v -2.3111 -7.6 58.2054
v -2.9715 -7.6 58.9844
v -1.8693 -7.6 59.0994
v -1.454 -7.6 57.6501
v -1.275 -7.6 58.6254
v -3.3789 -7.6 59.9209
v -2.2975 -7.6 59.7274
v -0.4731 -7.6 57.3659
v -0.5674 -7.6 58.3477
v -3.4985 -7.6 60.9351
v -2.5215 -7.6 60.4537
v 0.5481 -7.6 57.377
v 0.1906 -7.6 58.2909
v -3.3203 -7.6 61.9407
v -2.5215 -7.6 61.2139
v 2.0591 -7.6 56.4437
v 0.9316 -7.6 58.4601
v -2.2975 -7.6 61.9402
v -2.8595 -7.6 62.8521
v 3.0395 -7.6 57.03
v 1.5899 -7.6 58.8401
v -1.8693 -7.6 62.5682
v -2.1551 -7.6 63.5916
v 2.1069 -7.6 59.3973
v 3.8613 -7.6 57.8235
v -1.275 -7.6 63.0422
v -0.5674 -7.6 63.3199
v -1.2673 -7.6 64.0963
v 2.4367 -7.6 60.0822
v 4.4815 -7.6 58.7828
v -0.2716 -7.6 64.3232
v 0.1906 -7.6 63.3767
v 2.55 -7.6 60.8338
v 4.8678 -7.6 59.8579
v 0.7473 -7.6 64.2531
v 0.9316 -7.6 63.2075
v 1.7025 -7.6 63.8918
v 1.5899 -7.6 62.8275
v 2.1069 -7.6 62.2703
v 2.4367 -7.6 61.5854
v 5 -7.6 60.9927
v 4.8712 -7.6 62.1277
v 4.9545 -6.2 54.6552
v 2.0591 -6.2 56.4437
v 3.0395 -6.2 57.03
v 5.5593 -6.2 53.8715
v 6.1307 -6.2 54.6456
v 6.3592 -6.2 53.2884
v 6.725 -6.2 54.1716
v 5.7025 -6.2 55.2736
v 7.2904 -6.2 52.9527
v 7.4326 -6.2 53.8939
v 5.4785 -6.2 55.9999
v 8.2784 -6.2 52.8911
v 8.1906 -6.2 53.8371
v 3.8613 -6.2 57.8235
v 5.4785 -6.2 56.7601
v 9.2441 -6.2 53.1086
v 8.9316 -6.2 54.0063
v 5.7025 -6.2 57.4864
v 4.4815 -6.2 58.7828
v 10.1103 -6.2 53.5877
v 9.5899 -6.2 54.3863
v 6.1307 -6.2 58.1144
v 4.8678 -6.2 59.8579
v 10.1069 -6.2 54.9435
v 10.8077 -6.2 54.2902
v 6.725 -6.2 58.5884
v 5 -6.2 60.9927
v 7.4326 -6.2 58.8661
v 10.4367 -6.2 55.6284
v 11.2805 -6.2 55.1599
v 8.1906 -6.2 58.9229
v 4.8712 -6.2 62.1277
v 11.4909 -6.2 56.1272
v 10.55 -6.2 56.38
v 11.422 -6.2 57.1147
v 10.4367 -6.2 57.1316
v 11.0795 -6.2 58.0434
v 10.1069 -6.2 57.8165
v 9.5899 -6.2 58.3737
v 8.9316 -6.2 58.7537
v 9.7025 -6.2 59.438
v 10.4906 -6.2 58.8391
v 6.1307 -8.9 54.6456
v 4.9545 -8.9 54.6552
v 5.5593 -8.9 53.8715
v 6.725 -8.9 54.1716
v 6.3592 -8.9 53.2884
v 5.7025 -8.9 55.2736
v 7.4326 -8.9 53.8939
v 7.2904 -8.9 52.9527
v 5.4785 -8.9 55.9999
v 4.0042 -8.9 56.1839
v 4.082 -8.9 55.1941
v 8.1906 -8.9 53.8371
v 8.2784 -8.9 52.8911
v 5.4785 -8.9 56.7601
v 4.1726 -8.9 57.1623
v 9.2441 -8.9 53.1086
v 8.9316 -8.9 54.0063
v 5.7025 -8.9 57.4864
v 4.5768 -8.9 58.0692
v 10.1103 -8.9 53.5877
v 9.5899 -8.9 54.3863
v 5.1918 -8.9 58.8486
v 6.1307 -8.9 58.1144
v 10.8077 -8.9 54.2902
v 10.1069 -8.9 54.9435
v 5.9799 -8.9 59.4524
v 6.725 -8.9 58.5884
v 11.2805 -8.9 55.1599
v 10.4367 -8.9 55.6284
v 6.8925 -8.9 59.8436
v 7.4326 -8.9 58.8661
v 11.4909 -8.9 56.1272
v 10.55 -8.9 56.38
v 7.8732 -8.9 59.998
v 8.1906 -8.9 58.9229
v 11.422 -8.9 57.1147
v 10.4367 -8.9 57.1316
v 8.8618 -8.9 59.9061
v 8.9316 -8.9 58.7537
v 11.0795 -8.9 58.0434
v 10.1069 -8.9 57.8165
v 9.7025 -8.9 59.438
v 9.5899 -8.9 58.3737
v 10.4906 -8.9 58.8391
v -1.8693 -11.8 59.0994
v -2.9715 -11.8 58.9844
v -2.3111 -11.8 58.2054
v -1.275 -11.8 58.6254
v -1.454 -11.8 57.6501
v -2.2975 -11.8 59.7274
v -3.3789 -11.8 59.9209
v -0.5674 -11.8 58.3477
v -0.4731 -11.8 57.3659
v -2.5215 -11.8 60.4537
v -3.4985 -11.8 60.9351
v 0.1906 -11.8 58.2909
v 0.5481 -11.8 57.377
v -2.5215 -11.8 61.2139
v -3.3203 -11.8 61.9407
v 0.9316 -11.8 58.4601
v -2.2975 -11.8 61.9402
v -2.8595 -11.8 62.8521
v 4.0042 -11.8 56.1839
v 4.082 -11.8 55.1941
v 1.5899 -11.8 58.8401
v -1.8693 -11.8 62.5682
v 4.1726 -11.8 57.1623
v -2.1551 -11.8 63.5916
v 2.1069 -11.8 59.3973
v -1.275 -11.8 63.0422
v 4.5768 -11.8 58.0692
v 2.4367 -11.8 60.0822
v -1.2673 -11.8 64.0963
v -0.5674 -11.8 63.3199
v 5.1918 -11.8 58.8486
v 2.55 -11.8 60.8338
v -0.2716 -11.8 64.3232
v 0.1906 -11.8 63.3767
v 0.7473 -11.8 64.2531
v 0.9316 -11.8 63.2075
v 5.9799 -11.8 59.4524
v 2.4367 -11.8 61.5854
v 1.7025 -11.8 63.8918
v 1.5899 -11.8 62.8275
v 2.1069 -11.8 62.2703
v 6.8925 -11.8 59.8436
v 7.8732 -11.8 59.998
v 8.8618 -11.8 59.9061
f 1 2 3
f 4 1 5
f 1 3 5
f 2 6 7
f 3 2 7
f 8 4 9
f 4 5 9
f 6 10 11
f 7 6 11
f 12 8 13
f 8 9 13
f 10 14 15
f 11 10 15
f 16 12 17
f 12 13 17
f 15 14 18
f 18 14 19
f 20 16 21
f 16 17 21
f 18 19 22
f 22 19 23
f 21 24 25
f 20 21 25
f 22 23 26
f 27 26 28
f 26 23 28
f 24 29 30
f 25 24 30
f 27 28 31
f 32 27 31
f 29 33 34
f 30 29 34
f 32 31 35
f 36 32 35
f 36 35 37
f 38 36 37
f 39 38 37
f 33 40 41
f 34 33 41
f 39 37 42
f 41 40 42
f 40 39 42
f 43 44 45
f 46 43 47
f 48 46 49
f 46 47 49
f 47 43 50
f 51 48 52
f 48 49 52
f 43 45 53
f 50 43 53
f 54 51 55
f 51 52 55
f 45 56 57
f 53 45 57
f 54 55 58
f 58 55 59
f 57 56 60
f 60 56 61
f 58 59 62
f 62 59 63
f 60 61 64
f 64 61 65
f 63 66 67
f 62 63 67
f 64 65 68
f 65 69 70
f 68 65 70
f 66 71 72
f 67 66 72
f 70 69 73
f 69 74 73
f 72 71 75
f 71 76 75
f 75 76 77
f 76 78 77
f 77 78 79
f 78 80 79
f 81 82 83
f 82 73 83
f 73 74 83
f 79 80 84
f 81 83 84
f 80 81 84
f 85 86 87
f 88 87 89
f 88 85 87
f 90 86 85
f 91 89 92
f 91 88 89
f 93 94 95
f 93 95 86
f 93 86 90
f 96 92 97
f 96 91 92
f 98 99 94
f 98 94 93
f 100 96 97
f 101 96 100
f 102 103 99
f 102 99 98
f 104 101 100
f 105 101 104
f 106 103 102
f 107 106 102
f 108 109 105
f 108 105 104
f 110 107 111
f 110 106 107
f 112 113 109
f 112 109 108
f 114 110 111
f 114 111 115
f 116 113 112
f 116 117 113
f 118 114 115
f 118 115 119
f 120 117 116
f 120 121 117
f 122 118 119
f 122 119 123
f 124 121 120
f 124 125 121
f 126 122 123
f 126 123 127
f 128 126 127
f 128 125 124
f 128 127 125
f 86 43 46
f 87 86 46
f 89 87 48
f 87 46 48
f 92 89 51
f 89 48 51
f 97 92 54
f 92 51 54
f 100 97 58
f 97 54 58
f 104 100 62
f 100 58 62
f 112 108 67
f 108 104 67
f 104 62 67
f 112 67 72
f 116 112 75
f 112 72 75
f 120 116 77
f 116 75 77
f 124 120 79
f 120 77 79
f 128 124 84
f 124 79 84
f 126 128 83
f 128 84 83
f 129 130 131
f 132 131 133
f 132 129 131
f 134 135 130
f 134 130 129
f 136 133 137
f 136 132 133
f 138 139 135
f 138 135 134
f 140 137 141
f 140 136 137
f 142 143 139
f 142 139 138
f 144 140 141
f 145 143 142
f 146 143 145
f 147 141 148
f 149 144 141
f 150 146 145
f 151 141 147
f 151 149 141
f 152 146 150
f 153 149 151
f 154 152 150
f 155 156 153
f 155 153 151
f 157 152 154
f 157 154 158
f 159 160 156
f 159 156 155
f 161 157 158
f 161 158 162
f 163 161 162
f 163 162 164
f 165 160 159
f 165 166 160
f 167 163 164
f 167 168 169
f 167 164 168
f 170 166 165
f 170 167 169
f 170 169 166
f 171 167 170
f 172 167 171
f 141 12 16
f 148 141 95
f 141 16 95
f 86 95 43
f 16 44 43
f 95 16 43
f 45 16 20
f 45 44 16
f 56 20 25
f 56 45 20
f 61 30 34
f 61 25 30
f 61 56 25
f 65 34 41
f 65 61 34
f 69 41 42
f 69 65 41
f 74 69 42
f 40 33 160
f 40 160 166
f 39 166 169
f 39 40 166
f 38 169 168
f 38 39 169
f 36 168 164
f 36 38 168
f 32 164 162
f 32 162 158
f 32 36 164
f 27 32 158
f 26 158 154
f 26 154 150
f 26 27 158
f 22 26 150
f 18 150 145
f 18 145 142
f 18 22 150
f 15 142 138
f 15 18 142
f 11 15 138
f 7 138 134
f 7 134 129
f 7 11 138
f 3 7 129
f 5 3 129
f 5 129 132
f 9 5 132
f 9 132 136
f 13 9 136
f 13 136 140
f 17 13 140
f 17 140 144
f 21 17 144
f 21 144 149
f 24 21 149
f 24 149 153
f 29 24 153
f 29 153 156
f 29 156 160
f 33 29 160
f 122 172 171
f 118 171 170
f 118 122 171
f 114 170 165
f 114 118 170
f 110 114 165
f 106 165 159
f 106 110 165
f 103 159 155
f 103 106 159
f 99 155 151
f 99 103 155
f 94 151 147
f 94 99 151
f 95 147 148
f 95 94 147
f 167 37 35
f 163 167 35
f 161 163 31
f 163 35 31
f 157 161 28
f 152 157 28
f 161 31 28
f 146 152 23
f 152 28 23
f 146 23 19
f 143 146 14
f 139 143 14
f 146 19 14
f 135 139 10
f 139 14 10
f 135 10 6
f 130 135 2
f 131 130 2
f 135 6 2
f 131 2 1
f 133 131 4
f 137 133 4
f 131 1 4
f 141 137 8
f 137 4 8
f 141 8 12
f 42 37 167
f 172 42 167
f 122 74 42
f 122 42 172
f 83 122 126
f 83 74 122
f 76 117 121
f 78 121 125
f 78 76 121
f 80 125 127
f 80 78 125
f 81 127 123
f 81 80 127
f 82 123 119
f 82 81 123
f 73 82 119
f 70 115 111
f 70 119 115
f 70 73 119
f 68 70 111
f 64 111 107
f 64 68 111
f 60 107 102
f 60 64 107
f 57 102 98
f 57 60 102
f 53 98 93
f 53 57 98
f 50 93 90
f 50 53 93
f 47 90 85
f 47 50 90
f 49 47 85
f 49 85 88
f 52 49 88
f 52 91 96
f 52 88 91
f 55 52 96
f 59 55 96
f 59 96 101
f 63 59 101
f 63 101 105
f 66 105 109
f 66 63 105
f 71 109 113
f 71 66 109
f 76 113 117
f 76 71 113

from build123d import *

# Parameters (mm, degrees)
SKETCH012_R       = 2.55
PAD010_DEPTH      = 5.6
CYLINDER008_R     = 5
CYLINDER008_DEPTH = 10
CYLINDER009_R     = 4
CYLINDER009_DEPTH = 8


with BuildPart() as part:
    # Sketch012 → Pad010 (new body)
    with BuildSketch(Plane.XZ.offset(6.2)):
        with BuildLine():
            ThreePointArc((4.954527, 54.655154), (10.483926, 53.914212), (9.702481, 59.438032))
            Line((1.702481, 63.891826), (9.702481, 59.438032))
            ThreePointArc((1.702481, 63.891826), (-3.446315, 61.444457), (0.548094, 57.376976))
            Line((0.548094, 57.376976), (4.954527, 54.655154))
        make_face()
        with Locations((8, 56.38)):
            Circle(SKETCH012_R, mode=Mode.SUBTRACT)
        with Locations((0, 60.833794)):
            Circle(SKETCH012_R, mode=Mode.SUBTRACT)
    extrude(amount=PAD010_DEPTH)

    # Cylinder008 → Cylinder008 (cut)
    with BuildSketch(Plane(origin=(0, 2.4, 61), x_dir=(1, 0, 0), z_dir=(0, -1, 0))):
        Circle(CYLINDER008_R)
    extrude(amount=CYLINDER008_DEPTH, mode=Mode.SUBTRACT)

    # Cylinder009 → Cylinder009 (cut)
    with BuildSketch(Plane(origin=(8, -8.9, 56), x_dir=(1, 0, 0), z_dir=(0, -1, 0))):
        Circle(CYLINDER009_R)
    extrude(amount=CYLINDER009_DEPTH, mode=Mode.SUBTRACT)


solid = part.part
